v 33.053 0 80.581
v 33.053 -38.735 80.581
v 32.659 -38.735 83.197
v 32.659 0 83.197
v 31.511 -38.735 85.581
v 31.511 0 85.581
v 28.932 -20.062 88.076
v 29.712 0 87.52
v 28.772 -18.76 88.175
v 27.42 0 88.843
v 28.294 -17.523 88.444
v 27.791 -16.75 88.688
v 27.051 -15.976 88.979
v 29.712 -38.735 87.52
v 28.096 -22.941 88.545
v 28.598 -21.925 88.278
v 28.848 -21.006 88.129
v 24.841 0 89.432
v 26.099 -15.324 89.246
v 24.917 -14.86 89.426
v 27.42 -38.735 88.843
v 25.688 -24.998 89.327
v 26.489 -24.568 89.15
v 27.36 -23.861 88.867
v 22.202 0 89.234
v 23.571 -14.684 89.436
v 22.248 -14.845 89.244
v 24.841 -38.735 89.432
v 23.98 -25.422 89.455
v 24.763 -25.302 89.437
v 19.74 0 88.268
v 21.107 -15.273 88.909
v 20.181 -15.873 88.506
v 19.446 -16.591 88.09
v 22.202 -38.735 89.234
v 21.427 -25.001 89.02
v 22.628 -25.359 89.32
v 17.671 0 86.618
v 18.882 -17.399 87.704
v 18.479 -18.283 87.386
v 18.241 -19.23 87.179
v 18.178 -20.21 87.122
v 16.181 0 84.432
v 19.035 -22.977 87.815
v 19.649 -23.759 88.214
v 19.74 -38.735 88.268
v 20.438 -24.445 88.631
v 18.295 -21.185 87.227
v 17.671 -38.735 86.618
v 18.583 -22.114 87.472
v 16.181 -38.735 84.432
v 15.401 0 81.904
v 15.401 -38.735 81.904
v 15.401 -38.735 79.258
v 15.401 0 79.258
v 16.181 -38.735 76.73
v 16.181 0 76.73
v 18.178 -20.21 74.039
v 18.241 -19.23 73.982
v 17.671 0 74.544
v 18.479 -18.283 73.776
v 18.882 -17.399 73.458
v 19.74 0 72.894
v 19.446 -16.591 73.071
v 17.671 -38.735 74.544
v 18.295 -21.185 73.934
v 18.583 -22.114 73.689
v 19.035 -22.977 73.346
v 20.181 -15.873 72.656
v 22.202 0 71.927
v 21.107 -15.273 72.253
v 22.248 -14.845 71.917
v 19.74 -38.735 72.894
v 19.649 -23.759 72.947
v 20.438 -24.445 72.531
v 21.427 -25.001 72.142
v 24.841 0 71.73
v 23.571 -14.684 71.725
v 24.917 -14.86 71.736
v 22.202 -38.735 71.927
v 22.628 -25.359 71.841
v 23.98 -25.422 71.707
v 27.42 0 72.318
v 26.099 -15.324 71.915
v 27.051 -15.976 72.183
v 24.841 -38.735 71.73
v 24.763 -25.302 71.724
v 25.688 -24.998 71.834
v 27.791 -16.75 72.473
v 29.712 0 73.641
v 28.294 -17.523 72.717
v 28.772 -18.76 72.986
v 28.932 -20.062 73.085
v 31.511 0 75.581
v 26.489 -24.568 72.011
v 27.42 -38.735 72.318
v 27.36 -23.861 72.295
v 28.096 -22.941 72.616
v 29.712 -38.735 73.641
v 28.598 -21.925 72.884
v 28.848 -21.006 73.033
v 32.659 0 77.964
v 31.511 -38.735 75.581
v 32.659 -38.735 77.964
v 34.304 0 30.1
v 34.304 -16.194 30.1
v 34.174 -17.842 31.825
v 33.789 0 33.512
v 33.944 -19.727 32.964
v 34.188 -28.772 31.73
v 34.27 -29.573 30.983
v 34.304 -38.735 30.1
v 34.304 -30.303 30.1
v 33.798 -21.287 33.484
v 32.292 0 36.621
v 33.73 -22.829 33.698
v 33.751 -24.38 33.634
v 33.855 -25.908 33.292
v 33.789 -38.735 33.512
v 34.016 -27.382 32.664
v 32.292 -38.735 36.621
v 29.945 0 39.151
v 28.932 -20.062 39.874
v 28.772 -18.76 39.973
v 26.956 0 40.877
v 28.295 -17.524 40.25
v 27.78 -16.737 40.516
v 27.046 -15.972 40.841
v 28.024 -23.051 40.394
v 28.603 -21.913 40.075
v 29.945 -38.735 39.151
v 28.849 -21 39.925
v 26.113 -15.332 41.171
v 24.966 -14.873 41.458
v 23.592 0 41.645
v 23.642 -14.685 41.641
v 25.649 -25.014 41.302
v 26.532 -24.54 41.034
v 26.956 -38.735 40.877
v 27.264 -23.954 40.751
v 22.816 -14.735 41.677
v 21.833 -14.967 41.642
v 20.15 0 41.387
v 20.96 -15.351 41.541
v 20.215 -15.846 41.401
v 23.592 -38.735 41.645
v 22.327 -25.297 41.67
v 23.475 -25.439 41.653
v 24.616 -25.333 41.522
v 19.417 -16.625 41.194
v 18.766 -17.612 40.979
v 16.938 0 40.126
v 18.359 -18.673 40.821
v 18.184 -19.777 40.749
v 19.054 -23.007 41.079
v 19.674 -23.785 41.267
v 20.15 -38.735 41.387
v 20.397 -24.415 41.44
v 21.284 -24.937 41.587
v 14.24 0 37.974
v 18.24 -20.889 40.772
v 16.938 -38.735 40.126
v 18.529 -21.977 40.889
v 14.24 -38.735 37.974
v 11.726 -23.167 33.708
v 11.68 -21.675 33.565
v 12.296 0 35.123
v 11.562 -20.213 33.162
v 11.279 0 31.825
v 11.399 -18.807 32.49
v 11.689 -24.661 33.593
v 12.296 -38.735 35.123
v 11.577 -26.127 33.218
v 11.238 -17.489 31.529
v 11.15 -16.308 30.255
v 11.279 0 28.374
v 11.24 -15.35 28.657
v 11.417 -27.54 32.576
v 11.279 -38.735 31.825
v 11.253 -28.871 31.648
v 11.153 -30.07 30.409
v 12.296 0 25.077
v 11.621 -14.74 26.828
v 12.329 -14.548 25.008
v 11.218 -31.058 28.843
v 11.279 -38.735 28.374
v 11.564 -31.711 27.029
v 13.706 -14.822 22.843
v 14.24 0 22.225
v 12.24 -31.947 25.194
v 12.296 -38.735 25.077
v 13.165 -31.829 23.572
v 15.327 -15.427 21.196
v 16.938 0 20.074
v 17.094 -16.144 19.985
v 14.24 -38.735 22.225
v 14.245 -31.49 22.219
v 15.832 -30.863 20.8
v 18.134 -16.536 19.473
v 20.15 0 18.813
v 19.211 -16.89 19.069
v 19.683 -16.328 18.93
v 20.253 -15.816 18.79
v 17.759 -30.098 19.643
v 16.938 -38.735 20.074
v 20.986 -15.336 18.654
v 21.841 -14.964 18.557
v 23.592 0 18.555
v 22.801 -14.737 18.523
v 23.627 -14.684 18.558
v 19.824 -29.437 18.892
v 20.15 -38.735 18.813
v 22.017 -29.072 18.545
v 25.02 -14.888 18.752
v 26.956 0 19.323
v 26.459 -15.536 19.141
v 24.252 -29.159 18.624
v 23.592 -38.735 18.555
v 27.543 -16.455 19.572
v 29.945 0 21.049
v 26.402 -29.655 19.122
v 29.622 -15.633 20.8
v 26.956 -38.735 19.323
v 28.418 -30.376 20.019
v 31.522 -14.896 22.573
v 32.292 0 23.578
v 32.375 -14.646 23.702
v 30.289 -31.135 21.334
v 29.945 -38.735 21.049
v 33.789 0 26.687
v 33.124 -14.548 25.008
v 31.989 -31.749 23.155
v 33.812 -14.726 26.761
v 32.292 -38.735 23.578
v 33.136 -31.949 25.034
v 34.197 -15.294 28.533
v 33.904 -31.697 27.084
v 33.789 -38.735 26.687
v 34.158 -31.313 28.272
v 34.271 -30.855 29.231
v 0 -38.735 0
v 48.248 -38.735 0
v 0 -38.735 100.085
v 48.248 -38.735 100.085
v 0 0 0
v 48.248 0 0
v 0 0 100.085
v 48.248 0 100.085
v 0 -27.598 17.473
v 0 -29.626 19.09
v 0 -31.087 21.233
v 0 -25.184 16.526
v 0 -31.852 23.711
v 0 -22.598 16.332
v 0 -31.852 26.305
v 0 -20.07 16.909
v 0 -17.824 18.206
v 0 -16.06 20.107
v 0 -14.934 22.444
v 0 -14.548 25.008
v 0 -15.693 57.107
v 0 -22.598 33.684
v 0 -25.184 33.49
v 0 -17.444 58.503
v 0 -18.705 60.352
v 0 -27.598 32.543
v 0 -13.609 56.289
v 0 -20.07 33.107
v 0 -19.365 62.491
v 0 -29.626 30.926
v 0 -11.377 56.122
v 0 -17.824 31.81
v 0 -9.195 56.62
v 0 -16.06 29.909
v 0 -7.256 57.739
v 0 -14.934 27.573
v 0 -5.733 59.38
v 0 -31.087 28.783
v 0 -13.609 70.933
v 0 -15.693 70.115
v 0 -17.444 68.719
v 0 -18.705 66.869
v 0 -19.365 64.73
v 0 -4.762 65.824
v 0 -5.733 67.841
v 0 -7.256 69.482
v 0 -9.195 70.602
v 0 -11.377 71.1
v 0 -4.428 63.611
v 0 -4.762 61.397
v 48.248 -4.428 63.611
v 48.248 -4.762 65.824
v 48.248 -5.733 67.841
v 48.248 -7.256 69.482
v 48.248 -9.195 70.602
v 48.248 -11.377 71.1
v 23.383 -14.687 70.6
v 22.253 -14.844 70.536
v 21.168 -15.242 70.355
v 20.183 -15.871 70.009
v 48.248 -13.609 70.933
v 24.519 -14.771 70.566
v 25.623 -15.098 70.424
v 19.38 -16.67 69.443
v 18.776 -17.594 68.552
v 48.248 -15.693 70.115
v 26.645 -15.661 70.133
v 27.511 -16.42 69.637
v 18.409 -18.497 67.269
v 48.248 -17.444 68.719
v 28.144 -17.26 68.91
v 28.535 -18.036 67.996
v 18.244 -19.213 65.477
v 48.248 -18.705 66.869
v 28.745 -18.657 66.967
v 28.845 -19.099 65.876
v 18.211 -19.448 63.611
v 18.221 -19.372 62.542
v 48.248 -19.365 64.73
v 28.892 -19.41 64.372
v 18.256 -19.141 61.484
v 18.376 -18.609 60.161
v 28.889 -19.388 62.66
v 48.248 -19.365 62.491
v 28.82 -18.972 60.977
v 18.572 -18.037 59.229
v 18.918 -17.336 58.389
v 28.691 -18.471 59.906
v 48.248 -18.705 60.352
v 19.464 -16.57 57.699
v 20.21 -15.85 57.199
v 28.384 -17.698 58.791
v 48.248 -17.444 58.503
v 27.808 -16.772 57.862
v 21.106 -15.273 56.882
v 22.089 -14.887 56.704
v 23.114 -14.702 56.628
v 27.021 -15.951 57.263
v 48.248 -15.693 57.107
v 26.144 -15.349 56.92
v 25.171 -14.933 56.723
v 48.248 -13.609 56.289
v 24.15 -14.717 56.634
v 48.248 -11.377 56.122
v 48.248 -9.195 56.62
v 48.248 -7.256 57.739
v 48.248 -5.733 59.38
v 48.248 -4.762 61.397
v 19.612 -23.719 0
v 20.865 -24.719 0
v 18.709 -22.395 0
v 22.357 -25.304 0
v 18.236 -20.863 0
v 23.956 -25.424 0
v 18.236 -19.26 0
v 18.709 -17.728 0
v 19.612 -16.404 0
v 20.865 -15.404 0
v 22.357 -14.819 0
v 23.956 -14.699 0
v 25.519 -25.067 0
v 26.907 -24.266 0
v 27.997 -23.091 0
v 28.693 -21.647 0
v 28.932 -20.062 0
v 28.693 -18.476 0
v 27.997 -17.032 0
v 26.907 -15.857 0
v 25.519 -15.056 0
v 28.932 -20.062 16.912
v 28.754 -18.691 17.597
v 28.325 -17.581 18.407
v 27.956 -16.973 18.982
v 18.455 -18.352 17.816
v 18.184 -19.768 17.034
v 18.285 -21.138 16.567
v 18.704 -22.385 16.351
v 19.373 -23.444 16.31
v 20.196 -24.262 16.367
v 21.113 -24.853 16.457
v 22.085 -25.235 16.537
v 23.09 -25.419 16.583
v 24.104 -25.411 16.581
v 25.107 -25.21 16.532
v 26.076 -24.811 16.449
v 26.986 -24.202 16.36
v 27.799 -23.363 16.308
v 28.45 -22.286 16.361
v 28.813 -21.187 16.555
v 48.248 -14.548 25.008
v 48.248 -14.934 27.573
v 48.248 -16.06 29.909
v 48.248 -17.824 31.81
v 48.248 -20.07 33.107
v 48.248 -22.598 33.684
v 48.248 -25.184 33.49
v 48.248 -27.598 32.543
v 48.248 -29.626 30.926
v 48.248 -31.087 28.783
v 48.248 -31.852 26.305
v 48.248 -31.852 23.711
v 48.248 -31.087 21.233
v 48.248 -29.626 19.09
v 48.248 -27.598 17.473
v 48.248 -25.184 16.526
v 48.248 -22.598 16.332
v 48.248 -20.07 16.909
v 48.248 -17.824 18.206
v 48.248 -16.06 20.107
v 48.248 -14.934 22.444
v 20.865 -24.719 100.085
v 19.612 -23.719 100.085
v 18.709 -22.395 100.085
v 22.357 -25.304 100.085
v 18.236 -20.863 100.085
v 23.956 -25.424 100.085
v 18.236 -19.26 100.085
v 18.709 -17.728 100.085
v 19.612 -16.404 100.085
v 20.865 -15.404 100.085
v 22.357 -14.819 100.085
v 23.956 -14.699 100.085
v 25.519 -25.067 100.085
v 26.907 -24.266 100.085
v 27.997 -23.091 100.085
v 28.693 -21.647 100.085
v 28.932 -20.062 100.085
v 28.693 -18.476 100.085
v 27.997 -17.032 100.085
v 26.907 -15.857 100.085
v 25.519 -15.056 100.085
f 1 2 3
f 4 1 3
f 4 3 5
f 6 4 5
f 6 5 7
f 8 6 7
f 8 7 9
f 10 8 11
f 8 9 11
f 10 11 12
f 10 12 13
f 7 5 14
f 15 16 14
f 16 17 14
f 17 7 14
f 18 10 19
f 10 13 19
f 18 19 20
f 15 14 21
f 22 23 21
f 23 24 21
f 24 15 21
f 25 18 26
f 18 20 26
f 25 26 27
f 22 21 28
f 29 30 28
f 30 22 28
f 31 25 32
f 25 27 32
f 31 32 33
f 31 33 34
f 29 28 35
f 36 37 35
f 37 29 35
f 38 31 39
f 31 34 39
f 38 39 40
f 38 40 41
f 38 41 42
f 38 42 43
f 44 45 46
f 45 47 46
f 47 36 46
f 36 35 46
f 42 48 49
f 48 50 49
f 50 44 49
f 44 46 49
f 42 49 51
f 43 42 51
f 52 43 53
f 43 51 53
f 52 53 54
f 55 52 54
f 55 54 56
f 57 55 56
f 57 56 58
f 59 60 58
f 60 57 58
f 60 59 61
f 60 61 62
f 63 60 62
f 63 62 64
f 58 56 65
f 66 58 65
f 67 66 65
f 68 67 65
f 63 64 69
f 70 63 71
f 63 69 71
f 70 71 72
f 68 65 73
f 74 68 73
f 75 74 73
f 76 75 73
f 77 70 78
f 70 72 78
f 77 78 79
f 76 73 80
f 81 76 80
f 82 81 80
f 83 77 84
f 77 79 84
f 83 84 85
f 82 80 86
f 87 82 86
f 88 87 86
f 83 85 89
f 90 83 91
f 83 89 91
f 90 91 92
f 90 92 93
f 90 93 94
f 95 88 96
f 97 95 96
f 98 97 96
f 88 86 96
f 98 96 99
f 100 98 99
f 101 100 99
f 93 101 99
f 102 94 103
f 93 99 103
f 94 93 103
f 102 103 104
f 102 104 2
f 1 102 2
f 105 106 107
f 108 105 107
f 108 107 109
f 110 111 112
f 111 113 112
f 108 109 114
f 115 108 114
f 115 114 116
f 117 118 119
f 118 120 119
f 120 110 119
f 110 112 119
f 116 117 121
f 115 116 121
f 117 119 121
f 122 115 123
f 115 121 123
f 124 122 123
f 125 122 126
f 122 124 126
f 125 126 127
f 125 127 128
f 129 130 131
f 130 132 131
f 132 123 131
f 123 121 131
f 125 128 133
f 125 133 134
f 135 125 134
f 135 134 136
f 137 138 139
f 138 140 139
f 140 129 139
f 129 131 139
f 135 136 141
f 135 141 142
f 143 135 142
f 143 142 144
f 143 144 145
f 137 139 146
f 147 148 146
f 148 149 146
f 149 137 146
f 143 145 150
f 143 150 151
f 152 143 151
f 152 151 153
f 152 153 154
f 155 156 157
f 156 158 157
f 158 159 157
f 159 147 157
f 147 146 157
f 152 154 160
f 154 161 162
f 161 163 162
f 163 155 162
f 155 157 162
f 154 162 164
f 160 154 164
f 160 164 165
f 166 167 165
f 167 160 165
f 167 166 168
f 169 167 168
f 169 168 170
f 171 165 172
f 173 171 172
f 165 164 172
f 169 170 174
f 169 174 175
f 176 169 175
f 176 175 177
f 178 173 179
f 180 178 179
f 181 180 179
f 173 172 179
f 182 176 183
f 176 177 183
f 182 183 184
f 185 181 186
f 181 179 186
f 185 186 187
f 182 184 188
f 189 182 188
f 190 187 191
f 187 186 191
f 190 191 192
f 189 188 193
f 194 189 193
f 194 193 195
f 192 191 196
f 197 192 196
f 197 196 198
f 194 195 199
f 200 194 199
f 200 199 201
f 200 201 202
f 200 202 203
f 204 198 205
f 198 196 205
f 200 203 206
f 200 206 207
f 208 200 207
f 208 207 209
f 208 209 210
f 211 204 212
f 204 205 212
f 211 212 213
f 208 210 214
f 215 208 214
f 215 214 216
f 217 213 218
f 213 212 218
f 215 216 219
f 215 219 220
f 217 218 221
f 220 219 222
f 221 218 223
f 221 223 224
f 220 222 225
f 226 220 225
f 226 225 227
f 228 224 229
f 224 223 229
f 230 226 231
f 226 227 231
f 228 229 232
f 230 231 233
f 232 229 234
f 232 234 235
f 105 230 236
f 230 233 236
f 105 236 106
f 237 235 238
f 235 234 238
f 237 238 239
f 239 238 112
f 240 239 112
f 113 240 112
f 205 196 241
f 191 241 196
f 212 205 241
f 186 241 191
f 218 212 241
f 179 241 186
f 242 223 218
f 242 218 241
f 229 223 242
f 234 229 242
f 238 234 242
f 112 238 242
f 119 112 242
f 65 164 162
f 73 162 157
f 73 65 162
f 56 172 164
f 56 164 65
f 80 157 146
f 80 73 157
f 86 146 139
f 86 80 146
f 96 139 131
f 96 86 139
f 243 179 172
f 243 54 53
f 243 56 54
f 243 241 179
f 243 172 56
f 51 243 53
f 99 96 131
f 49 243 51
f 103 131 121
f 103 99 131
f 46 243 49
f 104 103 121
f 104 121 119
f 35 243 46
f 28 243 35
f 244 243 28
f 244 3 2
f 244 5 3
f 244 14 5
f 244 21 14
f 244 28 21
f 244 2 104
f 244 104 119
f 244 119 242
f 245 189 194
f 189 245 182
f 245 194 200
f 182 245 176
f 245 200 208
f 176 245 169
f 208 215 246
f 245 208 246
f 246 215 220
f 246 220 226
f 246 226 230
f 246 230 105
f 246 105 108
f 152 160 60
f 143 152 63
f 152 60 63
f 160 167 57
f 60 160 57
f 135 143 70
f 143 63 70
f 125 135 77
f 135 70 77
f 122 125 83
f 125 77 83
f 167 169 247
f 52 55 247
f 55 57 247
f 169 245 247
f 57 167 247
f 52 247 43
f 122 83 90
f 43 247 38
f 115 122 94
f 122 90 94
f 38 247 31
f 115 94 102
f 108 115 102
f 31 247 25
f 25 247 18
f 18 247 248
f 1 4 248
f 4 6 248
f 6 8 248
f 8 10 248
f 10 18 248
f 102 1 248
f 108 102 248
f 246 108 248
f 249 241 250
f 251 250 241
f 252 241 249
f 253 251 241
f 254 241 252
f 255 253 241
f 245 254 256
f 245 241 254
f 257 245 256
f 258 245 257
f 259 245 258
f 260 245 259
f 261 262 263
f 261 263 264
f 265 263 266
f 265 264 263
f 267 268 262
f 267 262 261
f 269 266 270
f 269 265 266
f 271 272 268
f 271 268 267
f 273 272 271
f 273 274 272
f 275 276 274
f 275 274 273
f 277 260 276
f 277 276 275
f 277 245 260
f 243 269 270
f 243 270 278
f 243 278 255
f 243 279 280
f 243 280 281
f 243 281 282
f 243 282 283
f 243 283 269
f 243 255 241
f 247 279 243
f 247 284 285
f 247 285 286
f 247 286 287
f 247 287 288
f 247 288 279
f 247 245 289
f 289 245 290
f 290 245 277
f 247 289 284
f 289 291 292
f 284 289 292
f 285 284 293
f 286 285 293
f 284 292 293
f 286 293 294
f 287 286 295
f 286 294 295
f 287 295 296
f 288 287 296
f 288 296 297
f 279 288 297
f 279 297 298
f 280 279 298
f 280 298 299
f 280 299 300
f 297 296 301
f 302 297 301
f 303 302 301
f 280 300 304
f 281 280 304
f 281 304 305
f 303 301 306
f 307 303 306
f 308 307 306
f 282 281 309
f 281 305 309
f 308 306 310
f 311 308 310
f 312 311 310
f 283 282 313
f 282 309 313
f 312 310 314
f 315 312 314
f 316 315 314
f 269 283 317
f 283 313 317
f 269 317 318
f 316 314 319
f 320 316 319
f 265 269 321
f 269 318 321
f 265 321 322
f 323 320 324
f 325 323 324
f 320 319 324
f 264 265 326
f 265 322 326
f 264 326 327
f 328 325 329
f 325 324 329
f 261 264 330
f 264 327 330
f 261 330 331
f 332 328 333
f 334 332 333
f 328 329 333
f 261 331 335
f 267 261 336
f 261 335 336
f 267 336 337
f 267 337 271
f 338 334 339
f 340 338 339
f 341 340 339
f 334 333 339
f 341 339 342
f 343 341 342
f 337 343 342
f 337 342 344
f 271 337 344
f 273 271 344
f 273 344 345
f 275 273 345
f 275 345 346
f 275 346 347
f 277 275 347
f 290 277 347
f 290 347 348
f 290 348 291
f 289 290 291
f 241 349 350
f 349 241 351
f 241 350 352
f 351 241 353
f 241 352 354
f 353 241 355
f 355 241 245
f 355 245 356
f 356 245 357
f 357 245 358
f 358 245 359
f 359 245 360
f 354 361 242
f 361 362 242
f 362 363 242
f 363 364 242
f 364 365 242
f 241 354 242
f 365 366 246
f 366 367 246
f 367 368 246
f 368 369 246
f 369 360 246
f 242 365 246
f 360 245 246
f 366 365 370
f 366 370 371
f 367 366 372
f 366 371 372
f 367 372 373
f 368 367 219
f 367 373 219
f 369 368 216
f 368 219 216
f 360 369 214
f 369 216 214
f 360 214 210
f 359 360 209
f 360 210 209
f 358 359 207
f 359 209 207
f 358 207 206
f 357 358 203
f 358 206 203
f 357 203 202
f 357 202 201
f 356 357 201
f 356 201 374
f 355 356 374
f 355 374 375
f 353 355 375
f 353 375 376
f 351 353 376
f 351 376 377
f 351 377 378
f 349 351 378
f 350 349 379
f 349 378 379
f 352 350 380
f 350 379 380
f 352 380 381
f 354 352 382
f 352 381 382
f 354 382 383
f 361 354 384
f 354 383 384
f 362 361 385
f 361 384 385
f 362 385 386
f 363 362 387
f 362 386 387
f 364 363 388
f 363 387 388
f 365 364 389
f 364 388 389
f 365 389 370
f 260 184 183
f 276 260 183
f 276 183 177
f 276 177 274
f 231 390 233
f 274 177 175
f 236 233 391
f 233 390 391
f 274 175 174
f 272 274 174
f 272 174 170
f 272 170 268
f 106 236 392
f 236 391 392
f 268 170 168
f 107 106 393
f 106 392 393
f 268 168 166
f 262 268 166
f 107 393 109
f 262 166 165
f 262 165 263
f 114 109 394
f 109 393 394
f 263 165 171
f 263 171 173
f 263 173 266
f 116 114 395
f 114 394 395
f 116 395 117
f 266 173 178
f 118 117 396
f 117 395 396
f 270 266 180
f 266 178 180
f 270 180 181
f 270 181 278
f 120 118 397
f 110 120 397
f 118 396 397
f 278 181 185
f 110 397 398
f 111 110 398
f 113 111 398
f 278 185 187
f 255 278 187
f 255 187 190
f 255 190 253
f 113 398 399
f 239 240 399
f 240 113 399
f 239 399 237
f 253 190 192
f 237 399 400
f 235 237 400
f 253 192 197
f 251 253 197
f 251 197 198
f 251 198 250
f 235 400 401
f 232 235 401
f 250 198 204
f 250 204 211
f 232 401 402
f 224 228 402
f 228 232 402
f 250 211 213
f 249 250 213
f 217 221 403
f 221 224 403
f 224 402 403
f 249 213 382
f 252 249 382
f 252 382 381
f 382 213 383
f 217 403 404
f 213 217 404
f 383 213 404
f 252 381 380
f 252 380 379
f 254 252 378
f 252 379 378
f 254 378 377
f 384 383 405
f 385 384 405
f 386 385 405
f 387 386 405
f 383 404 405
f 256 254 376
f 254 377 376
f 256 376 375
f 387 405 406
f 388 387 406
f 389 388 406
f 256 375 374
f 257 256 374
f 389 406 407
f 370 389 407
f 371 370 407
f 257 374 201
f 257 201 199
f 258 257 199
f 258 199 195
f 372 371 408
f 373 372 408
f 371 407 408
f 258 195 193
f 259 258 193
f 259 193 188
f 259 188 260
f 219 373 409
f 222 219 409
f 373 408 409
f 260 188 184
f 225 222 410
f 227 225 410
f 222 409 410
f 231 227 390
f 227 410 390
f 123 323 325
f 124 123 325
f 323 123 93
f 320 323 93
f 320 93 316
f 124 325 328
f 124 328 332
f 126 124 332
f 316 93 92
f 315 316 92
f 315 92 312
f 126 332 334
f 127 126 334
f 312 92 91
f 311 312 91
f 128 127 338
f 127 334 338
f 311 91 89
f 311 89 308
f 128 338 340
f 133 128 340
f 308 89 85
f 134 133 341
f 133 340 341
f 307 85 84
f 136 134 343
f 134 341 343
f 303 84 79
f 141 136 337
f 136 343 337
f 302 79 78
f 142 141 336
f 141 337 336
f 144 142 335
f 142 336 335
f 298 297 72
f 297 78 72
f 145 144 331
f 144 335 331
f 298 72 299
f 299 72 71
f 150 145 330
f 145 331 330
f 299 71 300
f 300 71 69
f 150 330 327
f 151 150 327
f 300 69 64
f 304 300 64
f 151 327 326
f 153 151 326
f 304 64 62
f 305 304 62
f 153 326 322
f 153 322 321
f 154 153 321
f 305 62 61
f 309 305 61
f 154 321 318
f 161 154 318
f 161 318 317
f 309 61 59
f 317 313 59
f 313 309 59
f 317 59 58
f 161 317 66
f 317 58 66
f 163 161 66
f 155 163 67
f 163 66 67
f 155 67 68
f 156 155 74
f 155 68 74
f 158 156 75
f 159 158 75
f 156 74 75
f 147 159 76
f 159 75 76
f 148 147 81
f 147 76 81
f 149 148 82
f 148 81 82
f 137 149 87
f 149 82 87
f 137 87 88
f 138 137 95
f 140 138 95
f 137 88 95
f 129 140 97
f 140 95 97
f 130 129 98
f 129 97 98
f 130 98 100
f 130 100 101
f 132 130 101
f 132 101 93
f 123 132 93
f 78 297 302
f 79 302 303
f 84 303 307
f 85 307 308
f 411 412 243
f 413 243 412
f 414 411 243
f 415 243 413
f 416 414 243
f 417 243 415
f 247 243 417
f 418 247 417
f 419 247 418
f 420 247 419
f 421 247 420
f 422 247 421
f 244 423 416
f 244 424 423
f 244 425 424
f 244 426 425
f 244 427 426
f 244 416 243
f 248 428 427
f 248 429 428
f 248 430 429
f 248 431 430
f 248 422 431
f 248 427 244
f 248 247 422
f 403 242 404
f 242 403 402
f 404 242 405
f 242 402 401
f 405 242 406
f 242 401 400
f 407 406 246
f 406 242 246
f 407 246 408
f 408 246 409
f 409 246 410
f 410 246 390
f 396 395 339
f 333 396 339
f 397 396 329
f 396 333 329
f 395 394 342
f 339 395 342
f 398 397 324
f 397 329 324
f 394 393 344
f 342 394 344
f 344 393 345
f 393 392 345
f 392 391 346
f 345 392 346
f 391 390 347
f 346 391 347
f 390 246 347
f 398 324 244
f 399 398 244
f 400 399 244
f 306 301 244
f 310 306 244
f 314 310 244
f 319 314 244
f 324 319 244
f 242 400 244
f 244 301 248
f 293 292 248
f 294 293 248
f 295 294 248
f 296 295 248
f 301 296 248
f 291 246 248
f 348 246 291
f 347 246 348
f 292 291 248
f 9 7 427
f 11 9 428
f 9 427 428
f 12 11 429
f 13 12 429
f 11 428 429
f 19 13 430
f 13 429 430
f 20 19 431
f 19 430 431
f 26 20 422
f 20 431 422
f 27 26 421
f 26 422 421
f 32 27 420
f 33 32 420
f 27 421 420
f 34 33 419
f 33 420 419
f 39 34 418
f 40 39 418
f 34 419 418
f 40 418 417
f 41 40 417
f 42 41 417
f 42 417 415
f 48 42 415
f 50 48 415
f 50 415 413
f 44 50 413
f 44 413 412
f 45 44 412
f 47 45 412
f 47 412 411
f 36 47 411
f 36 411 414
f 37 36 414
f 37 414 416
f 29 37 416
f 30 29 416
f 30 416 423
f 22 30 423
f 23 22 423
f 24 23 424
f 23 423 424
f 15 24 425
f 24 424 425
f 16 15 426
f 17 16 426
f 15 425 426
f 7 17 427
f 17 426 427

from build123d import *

# Parameters (mm, degrees)
F0_W     = 48.24812
F0_H     = 100.085393
F1_DEPTH = 38.735
F2_R     = 8.875977
F3_DEPTH = 72.39
F4_R     = 11.577097
F5_DEPTH = 81.915
F6_R     = 7.510162
F6_R_2   = 8.700388
F7_DEPTH = 74.295
F8_R     = 5.377664
F9_DEPTH = 137.795


with BuildPart() as f1:
    # F0 (on Front) → F1 (new body)
    with BuildSketch(Plane.XZ):
        with Locations((24.12406, 50.042696)):
            Rectangle(F0_W, F0_H)
    extrude(amount=F1_DEPTH)

    # F2 (on face) → F3 (cut)
    with BuildSketch(Plane.XZ.offset(38.735)):
        with Locations((24.177499, 80.580726)):
            Circle(F2_R)
    extrude(amount=-F3_DEPTH, mode=Mode.SUBTRACT)

    # F4 (on face) → F5 (cut)
    with BuildSketch(Plane.XZ.offset(38.735)):
        with Locations((22.72643, 30.099884)):
            Circle(F4_R)
    extrude(amount=-F5_DEPTH, mode=Mode.SUBTRACT)

    # F6 (on face) → F7 (cut)
    with BuildSketch(Plane.YZ.offset(48.24812)):
        with Locations((-11.938325, 63.61071)):
            Circle(F6_R)
        with Locations((-23.248304, 25.008034)):
            Circle(F6_R_2)
    extrude(amount=-F7_DEPTH, mode=Mode.SUBTRACT)

    # F8 (on face) → F9 (cut)
    with BuildSketch(Plane.XY.offset(100.085393)):
        with Locations((23.553871, -20.061549)):
            Circle(F8_R)
    extrude(amount=-F9_DEPTH, mode=Mode.SUBTRACT)


solid = f1.part
